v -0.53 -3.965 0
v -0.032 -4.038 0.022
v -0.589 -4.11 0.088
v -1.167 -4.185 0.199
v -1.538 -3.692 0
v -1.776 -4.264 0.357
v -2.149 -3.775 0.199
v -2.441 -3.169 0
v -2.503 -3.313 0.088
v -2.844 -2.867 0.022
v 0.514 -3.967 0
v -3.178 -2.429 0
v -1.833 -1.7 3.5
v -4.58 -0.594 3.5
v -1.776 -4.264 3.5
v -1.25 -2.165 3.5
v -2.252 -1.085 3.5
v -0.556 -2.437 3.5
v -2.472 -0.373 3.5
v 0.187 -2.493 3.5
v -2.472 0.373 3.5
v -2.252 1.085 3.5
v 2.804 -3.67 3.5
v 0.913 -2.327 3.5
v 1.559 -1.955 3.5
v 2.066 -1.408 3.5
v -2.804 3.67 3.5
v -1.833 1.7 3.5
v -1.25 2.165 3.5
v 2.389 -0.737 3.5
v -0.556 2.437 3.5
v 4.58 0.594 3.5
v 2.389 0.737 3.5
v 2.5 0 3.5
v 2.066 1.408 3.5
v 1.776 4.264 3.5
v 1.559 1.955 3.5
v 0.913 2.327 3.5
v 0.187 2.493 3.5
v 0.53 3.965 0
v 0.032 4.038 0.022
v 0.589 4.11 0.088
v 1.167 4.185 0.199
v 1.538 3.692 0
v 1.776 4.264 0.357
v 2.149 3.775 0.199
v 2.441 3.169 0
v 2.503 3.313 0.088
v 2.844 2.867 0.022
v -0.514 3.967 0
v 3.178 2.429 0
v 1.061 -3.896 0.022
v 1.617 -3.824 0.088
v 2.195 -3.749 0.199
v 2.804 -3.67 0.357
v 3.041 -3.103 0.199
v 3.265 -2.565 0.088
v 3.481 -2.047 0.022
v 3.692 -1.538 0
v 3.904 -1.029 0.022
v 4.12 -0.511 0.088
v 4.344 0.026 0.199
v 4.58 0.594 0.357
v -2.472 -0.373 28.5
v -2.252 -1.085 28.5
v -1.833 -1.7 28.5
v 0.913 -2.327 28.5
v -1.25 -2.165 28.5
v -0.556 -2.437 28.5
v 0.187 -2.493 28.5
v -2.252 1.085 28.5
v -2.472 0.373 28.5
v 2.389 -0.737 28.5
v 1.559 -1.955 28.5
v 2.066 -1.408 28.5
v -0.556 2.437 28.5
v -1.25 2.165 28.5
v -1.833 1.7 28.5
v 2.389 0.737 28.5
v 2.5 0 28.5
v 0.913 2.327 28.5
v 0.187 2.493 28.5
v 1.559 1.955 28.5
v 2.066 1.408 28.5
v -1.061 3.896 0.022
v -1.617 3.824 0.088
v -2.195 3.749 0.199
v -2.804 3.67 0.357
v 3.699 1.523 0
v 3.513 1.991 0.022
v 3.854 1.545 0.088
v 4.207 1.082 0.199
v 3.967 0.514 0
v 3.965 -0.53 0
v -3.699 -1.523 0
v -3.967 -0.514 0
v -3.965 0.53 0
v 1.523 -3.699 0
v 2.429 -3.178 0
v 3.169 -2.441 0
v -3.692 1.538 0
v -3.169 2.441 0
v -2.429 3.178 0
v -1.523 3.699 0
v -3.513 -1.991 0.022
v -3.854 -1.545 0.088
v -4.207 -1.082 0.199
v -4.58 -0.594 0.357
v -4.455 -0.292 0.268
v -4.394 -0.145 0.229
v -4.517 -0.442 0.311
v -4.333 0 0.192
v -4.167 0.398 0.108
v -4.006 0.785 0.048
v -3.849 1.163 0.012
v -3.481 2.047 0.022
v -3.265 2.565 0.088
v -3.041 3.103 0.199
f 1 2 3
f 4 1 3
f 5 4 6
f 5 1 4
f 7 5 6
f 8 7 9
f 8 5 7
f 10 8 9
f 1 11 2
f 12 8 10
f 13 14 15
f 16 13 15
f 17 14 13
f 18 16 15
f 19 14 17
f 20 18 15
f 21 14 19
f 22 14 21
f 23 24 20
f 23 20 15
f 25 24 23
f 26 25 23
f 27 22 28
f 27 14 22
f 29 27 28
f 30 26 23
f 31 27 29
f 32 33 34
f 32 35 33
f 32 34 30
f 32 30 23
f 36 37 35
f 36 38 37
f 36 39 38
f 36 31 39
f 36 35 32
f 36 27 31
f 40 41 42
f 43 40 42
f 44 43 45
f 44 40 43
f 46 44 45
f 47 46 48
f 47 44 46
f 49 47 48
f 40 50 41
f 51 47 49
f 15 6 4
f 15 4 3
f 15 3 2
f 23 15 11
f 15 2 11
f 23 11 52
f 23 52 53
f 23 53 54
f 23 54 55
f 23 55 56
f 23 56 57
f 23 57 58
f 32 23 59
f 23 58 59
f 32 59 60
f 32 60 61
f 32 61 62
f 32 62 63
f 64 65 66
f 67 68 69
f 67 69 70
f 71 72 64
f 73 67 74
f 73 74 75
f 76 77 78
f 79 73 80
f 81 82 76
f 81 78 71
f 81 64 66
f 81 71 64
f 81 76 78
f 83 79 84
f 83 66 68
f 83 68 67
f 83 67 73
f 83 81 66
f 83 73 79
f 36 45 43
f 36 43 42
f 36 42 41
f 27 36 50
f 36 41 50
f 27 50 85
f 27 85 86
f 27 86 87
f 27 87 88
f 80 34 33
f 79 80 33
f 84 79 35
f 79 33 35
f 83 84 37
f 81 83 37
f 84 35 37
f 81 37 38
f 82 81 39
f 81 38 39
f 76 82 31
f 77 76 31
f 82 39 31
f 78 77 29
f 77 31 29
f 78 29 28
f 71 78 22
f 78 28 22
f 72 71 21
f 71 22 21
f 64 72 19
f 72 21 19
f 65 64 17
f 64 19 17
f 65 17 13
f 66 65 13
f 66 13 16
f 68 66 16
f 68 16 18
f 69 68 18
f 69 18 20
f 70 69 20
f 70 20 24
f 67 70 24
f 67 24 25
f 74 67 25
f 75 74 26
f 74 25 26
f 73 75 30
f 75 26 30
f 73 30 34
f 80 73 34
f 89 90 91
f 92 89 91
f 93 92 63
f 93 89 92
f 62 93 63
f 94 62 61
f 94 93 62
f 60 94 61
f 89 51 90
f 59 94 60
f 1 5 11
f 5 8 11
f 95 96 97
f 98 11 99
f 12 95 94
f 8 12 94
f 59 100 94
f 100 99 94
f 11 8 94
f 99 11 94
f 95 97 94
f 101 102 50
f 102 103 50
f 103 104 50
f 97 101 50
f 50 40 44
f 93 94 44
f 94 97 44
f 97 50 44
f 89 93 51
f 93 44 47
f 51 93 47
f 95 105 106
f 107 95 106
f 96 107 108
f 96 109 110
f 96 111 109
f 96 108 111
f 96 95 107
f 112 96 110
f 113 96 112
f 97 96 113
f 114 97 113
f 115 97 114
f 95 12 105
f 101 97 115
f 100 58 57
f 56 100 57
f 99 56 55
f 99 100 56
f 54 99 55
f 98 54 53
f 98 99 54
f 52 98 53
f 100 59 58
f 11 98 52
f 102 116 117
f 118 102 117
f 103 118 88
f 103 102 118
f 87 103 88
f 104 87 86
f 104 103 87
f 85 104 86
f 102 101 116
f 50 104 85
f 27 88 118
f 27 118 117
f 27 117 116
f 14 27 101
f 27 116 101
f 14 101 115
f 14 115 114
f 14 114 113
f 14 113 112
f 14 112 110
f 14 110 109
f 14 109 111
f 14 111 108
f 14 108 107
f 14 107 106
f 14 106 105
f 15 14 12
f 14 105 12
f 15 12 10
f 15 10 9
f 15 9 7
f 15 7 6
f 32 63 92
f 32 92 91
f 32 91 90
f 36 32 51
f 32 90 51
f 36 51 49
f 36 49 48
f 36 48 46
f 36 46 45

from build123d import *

# Parameters (mm, degrees)
BOSS_EXTRUDE1_DEPTH = 3.5
SKETCH2_OUTSIDE_W   = 31.08
SKETCH2_OUTSIDE_H   = 30.448
SKETCH2_OUTSIDE_R   = 4
CUT_EXTRUDE1_DEPTH  = 5
CUT_EXTRUDE1_DRAFT  = -60
SKETCH3_R           = 2.5
BOSS_EXTRUDE2_DEPTH = 25


with BuildPart() as part:
    # Sketch1 → Boss-Extrude1 (new body)
    with BuildSketch(Plane.XY):
        Polygon((1.77607371, 4.2636716), (-2.804411064, 3.669960751), (-4.580484774, -0.593710848), (-1.77607371, -4.2636716), (2.804411064, -3.669960751), (4.580484774, 0.593710848), align=None)
    extrude(amount=BOSS_EXTRUDE1_DEPTH)


with BuildPart() as cut_extrude1_tool:
    # Sketch2 outside → Cut-Extrude1 (with draft: the straight prism first)
    with BuildSketch(Plane(origin=(0, 0, 0), x_dir=(-1, 0, 0), z_dir=(0, 0, -1))):
        Rectangle(SKETCH2_OUTSIDE_W, SKETCH2_OUTSIDE_H)
        Circle(SKETCH2_OUTSIDE_R, mode=Mode.SUBTRACT)
    extrude(amount=-CUT_EXTRUDE1_DEPTH)
    # Cut-Extrude1: the draft: its side faces are tilted about the plane it starts from
    cut_extrude1_sides = [cut_extrude1_tool.faces().sort_by_distance(p)[0] for p in [
        (0, -15.224, 2.5),
        (-15.54, 0, 2.5),
        (0, 15.224, 2.5),
        (15.54, 0, 2.5),
        (4, 0, 2.5),
    ]]
    draft(cut_extrude1_sides, Plane(origin=(0, 0, 0), x_dir=(-1, 0, 0), z_dir=(0, 0, -1)), CUT_EXTRUDE1_DRAFT)


with BuildPart() as part_1:
    add(part.part)

    # Cut-Extrude1: cut by cut_extrude1_tool
    add(cut_extrude1_tool.part, mode=Mode.SUBTRACT)

    # Sketch3 → Boss-Extrude2 (add)
    with BuildSketch(Plane.XY.offset(3.5)):
        Circle(SKETCH3_R)
    extrude(amount=BOSS_EXTRUDE2_DEPTH)


solid = part_1.part
